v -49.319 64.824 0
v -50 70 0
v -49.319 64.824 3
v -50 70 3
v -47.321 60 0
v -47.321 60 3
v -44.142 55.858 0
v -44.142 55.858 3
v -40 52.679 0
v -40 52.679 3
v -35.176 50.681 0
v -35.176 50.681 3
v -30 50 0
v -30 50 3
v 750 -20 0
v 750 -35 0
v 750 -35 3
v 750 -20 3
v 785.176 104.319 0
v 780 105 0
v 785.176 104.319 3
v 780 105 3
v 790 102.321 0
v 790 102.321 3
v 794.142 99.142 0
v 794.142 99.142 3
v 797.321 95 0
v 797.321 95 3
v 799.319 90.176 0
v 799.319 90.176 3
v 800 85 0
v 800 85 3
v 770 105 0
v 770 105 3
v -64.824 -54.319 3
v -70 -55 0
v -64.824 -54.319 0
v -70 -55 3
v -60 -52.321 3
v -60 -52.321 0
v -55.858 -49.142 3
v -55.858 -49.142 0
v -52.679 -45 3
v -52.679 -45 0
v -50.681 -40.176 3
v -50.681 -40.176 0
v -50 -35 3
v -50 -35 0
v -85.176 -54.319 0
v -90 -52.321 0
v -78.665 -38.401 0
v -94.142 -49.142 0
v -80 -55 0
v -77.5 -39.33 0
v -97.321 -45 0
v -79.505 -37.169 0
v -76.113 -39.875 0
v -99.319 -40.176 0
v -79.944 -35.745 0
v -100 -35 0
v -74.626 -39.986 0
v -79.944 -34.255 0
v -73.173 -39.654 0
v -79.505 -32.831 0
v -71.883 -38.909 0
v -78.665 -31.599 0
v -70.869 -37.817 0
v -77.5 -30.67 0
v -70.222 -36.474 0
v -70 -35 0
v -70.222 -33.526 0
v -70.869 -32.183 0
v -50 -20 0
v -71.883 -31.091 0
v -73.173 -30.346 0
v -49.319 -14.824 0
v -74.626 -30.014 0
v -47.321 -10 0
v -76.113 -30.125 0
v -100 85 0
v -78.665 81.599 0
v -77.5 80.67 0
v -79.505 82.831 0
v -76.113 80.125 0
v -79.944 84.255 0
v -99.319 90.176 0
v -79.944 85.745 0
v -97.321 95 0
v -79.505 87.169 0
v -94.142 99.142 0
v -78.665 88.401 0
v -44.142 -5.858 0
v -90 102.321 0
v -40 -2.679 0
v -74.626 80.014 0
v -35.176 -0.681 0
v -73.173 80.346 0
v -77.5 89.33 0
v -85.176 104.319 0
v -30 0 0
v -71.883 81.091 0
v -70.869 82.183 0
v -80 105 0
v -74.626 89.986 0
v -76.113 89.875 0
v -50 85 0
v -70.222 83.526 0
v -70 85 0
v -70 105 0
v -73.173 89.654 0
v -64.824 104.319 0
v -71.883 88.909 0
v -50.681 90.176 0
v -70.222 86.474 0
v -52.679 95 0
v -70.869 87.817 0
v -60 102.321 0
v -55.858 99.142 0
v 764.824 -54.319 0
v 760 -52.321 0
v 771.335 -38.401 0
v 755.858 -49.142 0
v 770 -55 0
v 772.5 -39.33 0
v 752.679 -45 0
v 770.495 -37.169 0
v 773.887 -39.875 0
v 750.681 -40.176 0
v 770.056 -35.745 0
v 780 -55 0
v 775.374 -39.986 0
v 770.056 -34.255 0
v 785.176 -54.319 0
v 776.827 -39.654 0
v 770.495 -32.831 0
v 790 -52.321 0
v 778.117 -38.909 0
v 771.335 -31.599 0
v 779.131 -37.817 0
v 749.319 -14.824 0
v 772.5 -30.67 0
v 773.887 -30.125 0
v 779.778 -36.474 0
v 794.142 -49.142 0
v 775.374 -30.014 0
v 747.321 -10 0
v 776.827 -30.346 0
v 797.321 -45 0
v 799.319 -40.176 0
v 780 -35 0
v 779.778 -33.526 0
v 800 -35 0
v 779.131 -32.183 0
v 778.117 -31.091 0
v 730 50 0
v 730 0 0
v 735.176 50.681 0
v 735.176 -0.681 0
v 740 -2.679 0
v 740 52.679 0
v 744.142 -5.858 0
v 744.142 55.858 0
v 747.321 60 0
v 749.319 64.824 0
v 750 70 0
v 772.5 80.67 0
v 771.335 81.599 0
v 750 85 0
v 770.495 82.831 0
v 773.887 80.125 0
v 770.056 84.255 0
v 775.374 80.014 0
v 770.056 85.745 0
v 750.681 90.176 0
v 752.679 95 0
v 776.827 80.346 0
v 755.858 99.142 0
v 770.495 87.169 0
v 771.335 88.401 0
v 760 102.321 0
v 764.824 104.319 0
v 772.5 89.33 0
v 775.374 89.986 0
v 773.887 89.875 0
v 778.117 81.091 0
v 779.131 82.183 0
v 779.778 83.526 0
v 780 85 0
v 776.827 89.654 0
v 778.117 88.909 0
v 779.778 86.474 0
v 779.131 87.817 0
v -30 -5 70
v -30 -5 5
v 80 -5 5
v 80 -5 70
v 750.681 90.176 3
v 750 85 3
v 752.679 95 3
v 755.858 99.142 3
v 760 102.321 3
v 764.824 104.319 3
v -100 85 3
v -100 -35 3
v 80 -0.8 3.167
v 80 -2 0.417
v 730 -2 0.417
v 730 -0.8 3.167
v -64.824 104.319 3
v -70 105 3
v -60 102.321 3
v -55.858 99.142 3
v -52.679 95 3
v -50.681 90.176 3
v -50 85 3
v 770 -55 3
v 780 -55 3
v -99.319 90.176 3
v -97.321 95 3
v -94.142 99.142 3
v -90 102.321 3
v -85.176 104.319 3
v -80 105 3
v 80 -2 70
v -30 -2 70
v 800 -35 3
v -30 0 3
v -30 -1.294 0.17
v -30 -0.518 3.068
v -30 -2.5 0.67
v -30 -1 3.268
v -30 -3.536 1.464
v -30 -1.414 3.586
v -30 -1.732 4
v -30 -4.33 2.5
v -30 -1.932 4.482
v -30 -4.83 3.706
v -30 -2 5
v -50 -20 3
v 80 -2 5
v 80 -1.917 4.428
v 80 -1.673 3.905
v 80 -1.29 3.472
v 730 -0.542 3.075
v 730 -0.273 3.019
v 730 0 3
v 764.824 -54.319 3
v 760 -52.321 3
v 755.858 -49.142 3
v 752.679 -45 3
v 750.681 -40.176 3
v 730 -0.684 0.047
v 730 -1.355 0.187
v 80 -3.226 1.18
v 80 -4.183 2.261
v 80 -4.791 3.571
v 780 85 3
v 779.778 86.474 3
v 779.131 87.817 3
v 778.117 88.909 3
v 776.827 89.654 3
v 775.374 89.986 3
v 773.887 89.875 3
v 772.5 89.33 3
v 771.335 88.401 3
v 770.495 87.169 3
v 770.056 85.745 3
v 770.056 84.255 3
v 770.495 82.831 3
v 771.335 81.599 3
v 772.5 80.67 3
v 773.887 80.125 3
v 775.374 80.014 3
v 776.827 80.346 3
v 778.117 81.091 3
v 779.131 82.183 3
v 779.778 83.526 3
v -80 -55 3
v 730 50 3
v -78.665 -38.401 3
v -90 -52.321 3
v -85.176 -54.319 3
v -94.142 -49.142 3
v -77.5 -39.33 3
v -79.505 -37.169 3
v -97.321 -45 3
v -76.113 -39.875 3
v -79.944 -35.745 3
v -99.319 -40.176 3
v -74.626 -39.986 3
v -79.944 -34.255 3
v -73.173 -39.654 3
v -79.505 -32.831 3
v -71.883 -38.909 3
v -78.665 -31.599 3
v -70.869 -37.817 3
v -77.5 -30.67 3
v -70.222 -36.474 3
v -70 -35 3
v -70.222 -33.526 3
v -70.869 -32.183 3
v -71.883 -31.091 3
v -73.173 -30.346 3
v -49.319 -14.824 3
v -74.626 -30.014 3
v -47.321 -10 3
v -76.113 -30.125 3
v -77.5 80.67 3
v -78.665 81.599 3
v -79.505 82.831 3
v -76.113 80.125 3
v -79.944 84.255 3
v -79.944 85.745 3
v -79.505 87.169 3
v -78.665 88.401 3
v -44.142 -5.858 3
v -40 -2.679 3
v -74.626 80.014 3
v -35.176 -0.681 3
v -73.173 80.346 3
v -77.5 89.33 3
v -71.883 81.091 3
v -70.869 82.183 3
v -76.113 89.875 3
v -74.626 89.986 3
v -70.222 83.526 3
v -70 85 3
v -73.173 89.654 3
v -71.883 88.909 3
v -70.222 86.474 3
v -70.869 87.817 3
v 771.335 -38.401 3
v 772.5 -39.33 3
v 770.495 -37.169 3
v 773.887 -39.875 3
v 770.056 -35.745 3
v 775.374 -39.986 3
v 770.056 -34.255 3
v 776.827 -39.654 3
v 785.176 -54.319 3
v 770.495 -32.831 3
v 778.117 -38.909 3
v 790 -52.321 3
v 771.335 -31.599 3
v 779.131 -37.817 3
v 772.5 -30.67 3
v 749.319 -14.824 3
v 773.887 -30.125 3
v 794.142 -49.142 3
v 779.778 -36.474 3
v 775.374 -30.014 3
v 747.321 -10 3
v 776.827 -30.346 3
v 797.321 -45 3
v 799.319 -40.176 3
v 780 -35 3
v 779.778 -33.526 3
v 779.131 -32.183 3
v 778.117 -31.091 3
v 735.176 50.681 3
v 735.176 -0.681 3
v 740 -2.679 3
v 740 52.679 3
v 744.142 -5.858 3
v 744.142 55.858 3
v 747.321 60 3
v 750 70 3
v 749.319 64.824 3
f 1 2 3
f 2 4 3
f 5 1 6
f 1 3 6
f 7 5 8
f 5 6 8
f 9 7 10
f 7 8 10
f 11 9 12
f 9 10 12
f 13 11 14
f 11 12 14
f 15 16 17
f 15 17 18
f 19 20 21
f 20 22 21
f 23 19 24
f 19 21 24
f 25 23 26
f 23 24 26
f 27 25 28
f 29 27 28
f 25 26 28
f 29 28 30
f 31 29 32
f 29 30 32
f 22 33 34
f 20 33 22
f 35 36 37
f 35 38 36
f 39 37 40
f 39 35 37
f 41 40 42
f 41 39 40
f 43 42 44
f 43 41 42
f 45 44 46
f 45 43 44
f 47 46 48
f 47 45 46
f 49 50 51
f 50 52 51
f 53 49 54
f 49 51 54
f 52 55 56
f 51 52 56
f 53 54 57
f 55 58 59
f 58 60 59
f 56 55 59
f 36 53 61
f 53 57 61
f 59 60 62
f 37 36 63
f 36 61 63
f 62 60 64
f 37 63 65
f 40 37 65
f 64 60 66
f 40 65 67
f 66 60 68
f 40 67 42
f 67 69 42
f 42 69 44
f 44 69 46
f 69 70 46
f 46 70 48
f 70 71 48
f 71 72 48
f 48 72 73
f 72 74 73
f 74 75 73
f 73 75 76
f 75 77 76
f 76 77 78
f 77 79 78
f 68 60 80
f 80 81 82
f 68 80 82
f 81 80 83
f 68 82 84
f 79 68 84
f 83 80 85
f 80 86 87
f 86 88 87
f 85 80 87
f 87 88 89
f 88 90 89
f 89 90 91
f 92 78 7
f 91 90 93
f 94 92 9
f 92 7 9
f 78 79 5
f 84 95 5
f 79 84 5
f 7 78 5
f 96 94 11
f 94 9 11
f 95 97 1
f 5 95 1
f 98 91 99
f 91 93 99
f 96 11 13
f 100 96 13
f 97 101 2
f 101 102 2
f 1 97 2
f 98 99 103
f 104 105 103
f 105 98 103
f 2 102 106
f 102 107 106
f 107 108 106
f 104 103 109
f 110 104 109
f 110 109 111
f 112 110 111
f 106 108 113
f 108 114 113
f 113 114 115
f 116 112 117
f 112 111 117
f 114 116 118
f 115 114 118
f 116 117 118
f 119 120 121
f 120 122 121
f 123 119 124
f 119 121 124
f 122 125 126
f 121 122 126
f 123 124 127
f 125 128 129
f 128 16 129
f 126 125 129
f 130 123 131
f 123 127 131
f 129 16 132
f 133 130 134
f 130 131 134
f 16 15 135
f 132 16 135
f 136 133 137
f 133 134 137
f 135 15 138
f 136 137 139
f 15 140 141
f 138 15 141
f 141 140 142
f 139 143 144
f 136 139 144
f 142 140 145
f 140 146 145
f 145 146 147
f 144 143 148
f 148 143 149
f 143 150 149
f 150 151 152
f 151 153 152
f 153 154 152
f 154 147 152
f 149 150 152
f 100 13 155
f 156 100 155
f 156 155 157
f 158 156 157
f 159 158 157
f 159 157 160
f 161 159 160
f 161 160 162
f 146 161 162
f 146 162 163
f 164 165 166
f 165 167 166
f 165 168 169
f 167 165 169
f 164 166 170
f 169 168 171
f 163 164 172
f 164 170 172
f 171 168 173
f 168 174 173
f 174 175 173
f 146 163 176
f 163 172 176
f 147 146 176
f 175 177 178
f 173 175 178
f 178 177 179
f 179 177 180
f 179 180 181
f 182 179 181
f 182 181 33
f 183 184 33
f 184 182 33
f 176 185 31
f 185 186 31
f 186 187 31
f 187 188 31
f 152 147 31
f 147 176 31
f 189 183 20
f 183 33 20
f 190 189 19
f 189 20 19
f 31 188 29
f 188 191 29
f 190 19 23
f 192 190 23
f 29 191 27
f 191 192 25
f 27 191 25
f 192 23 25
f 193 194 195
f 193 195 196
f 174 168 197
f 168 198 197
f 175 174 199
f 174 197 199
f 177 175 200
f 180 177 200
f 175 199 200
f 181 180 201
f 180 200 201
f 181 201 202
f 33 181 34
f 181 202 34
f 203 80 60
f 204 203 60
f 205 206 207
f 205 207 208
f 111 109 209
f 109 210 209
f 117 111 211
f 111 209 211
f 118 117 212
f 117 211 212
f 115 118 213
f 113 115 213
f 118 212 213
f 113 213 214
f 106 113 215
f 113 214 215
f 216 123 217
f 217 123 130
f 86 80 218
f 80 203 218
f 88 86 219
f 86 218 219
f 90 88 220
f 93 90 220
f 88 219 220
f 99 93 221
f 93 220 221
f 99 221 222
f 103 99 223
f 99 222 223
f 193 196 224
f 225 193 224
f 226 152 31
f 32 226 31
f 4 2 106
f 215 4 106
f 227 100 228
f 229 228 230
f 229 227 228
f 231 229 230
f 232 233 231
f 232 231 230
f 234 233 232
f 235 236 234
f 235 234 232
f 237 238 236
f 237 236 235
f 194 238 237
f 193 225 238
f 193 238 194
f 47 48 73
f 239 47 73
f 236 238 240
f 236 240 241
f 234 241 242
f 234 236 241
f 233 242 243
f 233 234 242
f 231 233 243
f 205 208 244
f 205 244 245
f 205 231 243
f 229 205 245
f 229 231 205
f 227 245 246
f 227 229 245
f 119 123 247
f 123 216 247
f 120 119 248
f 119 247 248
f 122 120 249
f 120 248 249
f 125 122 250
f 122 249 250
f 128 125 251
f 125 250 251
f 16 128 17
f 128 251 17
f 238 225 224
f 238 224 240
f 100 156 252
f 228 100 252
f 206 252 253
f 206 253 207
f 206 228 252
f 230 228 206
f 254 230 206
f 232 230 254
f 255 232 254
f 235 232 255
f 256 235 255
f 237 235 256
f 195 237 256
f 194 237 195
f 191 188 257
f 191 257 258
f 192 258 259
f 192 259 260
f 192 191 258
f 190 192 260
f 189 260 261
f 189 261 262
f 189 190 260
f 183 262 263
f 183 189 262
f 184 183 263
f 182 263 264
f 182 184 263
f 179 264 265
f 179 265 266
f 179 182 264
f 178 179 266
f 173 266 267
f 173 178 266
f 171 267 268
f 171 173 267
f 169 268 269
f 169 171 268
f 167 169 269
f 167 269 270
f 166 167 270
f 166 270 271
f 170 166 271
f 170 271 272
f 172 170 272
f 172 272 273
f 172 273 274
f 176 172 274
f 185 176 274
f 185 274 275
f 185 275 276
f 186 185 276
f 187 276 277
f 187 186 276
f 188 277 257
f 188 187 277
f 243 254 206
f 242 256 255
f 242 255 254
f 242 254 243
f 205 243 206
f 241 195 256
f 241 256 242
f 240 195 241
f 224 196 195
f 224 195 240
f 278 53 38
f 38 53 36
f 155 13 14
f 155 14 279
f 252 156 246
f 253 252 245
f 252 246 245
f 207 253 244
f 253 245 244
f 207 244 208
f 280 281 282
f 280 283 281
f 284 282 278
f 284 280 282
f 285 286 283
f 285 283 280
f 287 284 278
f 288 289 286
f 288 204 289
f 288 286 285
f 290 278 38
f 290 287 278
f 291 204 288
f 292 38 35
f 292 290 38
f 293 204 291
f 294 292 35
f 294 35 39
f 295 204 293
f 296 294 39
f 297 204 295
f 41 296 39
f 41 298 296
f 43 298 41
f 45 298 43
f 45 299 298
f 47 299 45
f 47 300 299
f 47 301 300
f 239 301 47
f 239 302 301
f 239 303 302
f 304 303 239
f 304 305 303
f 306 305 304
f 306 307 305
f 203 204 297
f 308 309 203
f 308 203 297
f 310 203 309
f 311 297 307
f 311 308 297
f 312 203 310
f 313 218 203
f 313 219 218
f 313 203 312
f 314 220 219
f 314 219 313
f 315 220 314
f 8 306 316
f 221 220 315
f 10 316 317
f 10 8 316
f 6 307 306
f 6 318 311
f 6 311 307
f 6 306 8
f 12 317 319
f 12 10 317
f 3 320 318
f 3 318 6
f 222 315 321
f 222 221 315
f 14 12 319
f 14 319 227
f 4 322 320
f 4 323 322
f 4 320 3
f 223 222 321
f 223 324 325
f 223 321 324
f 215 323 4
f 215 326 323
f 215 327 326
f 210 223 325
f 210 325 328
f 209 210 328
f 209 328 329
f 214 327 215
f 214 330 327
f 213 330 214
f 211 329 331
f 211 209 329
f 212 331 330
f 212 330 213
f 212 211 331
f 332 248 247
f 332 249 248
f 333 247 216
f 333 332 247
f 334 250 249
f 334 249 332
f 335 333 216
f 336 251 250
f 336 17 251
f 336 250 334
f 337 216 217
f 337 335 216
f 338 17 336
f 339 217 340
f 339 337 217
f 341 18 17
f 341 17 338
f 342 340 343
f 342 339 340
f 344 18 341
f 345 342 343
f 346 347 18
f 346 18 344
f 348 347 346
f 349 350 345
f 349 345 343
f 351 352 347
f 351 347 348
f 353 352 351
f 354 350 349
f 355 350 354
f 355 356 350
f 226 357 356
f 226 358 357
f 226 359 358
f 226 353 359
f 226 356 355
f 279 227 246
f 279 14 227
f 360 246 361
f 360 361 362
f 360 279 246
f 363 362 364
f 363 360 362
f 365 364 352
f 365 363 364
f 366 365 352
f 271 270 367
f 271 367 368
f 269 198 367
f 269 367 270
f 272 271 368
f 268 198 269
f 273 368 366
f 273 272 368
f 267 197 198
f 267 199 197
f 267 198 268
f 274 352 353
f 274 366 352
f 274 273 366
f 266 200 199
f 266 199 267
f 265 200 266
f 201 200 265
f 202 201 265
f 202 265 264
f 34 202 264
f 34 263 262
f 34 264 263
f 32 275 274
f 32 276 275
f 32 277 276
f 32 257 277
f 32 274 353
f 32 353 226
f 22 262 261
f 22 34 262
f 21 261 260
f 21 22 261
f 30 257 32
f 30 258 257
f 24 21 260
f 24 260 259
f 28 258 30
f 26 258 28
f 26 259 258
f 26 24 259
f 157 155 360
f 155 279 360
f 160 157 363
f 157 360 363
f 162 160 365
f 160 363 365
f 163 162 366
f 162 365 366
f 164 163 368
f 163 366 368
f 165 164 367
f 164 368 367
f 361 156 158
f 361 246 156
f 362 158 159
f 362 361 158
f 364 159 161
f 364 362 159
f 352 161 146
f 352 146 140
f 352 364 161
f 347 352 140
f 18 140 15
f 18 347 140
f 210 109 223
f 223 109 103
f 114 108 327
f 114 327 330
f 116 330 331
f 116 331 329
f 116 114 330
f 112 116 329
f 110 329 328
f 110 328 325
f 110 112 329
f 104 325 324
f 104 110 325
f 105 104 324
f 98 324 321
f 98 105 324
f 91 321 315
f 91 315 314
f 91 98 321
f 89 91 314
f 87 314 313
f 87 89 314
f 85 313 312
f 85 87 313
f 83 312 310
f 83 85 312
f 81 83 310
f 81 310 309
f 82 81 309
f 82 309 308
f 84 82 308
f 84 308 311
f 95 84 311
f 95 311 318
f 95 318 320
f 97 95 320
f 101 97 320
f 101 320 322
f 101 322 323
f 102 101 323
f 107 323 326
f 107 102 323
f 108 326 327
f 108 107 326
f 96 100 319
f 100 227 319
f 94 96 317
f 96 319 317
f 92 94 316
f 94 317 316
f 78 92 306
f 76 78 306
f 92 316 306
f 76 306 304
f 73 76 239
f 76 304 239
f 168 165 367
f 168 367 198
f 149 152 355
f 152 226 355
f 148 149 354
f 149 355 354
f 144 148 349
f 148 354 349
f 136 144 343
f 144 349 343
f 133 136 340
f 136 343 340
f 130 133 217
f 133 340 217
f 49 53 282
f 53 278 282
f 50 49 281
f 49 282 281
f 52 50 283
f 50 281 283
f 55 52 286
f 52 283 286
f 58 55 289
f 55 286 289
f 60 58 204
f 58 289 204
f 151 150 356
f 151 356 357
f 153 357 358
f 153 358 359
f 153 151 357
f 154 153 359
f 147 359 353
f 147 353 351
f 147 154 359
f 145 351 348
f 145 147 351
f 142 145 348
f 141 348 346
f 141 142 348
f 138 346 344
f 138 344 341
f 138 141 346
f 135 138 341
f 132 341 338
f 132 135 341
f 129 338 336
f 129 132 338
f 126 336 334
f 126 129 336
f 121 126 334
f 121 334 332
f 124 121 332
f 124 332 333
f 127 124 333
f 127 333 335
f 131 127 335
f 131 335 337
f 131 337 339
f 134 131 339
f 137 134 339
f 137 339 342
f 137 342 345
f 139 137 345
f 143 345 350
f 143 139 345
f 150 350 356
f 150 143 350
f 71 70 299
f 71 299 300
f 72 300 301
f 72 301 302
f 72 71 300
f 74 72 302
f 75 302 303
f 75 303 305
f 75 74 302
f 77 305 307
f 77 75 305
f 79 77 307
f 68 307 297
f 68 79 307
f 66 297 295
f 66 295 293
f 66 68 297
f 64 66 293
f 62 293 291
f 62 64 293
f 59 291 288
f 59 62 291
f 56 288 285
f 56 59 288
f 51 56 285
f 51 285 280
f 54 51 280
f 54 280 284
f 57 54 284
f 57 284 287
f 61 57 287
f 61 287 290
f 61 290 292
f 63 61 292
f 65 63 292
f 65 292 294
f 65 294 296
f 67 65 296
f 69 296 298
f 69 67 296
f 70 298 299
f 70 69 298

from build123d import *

# Parameters (mm, degrees)
SKETCH1_W           = 700
SKETCH1_H           = 50
SKETCH1_W_2         = 50
SKETCH1_R           = 5
SKETCH1_H_2         = 160
BOSS_EXTRUDE1_DEPTH = 3
FILLET1_R           = 20
EDGE_FLANGE1_DEPTH  = 760
CUT_EXTRUDE1_START  = 80
CUT_EXTRUDE1_DEPTH  = 650


# Read off the part's stored shape, not the designer's step: Cut-Extrude1
# Sheet-metal steps are written as plain solids
with BuildPart() as part:
    # Sketch1 → Boss-Extrude1 (new body)
    # profile 1 of 5: a face of its own
    with BuildSketch(Plane.XY):
        with Locations((350, 25)):
            Rectangle(SKETCH1_W, SKETCH1_H)
    # profile 2 of 5: a face of its own
    with BuildSketch(Plane.XY):
        with Locations((-25, 25)):
            Rectangle(SKETCH1_W_2, SKETCH1_H)
    # profile 3 of 5: a face of its own
    with BuildSketch(Plane.XY):
        Polygon((-50, -55), (-50, 0), (-50, 50), (-50, 105), (-100, 105), (-100, -55), align=None)
        with Locations((-75, -35)):
            Circle(SKETCH1_R, mode=Mode.SUBTRACT)
        with Locations((-75, 85)):
            Circle(SKETCH1_R, mode=Mode.SUBTRACT)
    # profile 4 of 5: a face of its own
    with BuildSketch(Plane.XY):
        with Locations((775, 25)):
            Rectangle(SKETCH1_W_2, SKETCH1_H_2)
        with Locations((775, -35)):
            Circle(SKETCH1_R, mode=Mode.SUBTRACT)
        with Locations((775, 85)):
            Circle(SKETCH1_R, mode=Mode.SUBTRACT)
    # profile 5 of 5: a face of its own
    with BuildSketch(Plane.XY):
        with Locations((725, 25)):
            Rectangle(SKETCH1_W_2, SKETCH1_H)
    extrude(amount=BOSS_EXTRUDE1_DEPTH)

    # Fillet1
    fillet1_edges = [part.edges().sort_by_distance(p)[0] for p in [
        (-50, 0, 1.5),
        (-50, -55, 1.5),
        (-100, -55, 1.5),
        (-100, 105, 1.5),
        (-50, 105, 1.5),
        (-50, 50, 1.5),
        (750, 50, 1.5),
        (750, 105, 1.5),
        (800, 105, 1.5),
        (800, -55, 1.5),
        (750, -55, 1.5),
        (750, 0, 1.5),
    ]]
    fillet(fillet1_edges, radius=FILLET1_R)

    # Edge-Flange1 section (across the edge) → Edge-Flange1 (add)
    with BuildSketch(Plane(origin=(-30, -2, 3), x_dir=(0, 1, 0), z_dir=(1, 0, 0))):
        with BuildLine():
            Line((-3, 2), (-3, 67))
            Line((-3, 67), (0, 67))
            Line((0, 67), (0, 2))
            ThreePointArc((0, 2), (0.585786438, 0.585786438), (2, 0))
            Line((2, 0), (2, -3))
            ThreePointArc((2, -3), (-1.535533906, -1.535533906), (-3, 2))
        make_face()
    extrude(amount=EDGE_FLANGE1_DEPTH)

    # Cut-Extrude1 outline → Cut-Extrude1 (cut)
    with BuildSketch(Plane.YZ.offset(CUT_EXTRUDE1_START)):
        with BuildLine():
            ThreePointArc((-5, 5), (-4.183300133, 2.261387212), (-2, 0.417424305))
            Line((-2, 0.417424305), (-0.8, 3.166969722))
            ThreePointArc((-0.8, 3.166969722), (-1.673320053, 3.904554885), (-2, 5))
            Line((-2, 5), (-2, 70))
            Line((-2, 70), (-5, 70))
            Line((-5, 70), (-5, 5))
        make_face()
    extrude(amount=CUT_EXTRUDE1_DEPTH, mode=Mode.SUBTRACT)


solid = part.part
